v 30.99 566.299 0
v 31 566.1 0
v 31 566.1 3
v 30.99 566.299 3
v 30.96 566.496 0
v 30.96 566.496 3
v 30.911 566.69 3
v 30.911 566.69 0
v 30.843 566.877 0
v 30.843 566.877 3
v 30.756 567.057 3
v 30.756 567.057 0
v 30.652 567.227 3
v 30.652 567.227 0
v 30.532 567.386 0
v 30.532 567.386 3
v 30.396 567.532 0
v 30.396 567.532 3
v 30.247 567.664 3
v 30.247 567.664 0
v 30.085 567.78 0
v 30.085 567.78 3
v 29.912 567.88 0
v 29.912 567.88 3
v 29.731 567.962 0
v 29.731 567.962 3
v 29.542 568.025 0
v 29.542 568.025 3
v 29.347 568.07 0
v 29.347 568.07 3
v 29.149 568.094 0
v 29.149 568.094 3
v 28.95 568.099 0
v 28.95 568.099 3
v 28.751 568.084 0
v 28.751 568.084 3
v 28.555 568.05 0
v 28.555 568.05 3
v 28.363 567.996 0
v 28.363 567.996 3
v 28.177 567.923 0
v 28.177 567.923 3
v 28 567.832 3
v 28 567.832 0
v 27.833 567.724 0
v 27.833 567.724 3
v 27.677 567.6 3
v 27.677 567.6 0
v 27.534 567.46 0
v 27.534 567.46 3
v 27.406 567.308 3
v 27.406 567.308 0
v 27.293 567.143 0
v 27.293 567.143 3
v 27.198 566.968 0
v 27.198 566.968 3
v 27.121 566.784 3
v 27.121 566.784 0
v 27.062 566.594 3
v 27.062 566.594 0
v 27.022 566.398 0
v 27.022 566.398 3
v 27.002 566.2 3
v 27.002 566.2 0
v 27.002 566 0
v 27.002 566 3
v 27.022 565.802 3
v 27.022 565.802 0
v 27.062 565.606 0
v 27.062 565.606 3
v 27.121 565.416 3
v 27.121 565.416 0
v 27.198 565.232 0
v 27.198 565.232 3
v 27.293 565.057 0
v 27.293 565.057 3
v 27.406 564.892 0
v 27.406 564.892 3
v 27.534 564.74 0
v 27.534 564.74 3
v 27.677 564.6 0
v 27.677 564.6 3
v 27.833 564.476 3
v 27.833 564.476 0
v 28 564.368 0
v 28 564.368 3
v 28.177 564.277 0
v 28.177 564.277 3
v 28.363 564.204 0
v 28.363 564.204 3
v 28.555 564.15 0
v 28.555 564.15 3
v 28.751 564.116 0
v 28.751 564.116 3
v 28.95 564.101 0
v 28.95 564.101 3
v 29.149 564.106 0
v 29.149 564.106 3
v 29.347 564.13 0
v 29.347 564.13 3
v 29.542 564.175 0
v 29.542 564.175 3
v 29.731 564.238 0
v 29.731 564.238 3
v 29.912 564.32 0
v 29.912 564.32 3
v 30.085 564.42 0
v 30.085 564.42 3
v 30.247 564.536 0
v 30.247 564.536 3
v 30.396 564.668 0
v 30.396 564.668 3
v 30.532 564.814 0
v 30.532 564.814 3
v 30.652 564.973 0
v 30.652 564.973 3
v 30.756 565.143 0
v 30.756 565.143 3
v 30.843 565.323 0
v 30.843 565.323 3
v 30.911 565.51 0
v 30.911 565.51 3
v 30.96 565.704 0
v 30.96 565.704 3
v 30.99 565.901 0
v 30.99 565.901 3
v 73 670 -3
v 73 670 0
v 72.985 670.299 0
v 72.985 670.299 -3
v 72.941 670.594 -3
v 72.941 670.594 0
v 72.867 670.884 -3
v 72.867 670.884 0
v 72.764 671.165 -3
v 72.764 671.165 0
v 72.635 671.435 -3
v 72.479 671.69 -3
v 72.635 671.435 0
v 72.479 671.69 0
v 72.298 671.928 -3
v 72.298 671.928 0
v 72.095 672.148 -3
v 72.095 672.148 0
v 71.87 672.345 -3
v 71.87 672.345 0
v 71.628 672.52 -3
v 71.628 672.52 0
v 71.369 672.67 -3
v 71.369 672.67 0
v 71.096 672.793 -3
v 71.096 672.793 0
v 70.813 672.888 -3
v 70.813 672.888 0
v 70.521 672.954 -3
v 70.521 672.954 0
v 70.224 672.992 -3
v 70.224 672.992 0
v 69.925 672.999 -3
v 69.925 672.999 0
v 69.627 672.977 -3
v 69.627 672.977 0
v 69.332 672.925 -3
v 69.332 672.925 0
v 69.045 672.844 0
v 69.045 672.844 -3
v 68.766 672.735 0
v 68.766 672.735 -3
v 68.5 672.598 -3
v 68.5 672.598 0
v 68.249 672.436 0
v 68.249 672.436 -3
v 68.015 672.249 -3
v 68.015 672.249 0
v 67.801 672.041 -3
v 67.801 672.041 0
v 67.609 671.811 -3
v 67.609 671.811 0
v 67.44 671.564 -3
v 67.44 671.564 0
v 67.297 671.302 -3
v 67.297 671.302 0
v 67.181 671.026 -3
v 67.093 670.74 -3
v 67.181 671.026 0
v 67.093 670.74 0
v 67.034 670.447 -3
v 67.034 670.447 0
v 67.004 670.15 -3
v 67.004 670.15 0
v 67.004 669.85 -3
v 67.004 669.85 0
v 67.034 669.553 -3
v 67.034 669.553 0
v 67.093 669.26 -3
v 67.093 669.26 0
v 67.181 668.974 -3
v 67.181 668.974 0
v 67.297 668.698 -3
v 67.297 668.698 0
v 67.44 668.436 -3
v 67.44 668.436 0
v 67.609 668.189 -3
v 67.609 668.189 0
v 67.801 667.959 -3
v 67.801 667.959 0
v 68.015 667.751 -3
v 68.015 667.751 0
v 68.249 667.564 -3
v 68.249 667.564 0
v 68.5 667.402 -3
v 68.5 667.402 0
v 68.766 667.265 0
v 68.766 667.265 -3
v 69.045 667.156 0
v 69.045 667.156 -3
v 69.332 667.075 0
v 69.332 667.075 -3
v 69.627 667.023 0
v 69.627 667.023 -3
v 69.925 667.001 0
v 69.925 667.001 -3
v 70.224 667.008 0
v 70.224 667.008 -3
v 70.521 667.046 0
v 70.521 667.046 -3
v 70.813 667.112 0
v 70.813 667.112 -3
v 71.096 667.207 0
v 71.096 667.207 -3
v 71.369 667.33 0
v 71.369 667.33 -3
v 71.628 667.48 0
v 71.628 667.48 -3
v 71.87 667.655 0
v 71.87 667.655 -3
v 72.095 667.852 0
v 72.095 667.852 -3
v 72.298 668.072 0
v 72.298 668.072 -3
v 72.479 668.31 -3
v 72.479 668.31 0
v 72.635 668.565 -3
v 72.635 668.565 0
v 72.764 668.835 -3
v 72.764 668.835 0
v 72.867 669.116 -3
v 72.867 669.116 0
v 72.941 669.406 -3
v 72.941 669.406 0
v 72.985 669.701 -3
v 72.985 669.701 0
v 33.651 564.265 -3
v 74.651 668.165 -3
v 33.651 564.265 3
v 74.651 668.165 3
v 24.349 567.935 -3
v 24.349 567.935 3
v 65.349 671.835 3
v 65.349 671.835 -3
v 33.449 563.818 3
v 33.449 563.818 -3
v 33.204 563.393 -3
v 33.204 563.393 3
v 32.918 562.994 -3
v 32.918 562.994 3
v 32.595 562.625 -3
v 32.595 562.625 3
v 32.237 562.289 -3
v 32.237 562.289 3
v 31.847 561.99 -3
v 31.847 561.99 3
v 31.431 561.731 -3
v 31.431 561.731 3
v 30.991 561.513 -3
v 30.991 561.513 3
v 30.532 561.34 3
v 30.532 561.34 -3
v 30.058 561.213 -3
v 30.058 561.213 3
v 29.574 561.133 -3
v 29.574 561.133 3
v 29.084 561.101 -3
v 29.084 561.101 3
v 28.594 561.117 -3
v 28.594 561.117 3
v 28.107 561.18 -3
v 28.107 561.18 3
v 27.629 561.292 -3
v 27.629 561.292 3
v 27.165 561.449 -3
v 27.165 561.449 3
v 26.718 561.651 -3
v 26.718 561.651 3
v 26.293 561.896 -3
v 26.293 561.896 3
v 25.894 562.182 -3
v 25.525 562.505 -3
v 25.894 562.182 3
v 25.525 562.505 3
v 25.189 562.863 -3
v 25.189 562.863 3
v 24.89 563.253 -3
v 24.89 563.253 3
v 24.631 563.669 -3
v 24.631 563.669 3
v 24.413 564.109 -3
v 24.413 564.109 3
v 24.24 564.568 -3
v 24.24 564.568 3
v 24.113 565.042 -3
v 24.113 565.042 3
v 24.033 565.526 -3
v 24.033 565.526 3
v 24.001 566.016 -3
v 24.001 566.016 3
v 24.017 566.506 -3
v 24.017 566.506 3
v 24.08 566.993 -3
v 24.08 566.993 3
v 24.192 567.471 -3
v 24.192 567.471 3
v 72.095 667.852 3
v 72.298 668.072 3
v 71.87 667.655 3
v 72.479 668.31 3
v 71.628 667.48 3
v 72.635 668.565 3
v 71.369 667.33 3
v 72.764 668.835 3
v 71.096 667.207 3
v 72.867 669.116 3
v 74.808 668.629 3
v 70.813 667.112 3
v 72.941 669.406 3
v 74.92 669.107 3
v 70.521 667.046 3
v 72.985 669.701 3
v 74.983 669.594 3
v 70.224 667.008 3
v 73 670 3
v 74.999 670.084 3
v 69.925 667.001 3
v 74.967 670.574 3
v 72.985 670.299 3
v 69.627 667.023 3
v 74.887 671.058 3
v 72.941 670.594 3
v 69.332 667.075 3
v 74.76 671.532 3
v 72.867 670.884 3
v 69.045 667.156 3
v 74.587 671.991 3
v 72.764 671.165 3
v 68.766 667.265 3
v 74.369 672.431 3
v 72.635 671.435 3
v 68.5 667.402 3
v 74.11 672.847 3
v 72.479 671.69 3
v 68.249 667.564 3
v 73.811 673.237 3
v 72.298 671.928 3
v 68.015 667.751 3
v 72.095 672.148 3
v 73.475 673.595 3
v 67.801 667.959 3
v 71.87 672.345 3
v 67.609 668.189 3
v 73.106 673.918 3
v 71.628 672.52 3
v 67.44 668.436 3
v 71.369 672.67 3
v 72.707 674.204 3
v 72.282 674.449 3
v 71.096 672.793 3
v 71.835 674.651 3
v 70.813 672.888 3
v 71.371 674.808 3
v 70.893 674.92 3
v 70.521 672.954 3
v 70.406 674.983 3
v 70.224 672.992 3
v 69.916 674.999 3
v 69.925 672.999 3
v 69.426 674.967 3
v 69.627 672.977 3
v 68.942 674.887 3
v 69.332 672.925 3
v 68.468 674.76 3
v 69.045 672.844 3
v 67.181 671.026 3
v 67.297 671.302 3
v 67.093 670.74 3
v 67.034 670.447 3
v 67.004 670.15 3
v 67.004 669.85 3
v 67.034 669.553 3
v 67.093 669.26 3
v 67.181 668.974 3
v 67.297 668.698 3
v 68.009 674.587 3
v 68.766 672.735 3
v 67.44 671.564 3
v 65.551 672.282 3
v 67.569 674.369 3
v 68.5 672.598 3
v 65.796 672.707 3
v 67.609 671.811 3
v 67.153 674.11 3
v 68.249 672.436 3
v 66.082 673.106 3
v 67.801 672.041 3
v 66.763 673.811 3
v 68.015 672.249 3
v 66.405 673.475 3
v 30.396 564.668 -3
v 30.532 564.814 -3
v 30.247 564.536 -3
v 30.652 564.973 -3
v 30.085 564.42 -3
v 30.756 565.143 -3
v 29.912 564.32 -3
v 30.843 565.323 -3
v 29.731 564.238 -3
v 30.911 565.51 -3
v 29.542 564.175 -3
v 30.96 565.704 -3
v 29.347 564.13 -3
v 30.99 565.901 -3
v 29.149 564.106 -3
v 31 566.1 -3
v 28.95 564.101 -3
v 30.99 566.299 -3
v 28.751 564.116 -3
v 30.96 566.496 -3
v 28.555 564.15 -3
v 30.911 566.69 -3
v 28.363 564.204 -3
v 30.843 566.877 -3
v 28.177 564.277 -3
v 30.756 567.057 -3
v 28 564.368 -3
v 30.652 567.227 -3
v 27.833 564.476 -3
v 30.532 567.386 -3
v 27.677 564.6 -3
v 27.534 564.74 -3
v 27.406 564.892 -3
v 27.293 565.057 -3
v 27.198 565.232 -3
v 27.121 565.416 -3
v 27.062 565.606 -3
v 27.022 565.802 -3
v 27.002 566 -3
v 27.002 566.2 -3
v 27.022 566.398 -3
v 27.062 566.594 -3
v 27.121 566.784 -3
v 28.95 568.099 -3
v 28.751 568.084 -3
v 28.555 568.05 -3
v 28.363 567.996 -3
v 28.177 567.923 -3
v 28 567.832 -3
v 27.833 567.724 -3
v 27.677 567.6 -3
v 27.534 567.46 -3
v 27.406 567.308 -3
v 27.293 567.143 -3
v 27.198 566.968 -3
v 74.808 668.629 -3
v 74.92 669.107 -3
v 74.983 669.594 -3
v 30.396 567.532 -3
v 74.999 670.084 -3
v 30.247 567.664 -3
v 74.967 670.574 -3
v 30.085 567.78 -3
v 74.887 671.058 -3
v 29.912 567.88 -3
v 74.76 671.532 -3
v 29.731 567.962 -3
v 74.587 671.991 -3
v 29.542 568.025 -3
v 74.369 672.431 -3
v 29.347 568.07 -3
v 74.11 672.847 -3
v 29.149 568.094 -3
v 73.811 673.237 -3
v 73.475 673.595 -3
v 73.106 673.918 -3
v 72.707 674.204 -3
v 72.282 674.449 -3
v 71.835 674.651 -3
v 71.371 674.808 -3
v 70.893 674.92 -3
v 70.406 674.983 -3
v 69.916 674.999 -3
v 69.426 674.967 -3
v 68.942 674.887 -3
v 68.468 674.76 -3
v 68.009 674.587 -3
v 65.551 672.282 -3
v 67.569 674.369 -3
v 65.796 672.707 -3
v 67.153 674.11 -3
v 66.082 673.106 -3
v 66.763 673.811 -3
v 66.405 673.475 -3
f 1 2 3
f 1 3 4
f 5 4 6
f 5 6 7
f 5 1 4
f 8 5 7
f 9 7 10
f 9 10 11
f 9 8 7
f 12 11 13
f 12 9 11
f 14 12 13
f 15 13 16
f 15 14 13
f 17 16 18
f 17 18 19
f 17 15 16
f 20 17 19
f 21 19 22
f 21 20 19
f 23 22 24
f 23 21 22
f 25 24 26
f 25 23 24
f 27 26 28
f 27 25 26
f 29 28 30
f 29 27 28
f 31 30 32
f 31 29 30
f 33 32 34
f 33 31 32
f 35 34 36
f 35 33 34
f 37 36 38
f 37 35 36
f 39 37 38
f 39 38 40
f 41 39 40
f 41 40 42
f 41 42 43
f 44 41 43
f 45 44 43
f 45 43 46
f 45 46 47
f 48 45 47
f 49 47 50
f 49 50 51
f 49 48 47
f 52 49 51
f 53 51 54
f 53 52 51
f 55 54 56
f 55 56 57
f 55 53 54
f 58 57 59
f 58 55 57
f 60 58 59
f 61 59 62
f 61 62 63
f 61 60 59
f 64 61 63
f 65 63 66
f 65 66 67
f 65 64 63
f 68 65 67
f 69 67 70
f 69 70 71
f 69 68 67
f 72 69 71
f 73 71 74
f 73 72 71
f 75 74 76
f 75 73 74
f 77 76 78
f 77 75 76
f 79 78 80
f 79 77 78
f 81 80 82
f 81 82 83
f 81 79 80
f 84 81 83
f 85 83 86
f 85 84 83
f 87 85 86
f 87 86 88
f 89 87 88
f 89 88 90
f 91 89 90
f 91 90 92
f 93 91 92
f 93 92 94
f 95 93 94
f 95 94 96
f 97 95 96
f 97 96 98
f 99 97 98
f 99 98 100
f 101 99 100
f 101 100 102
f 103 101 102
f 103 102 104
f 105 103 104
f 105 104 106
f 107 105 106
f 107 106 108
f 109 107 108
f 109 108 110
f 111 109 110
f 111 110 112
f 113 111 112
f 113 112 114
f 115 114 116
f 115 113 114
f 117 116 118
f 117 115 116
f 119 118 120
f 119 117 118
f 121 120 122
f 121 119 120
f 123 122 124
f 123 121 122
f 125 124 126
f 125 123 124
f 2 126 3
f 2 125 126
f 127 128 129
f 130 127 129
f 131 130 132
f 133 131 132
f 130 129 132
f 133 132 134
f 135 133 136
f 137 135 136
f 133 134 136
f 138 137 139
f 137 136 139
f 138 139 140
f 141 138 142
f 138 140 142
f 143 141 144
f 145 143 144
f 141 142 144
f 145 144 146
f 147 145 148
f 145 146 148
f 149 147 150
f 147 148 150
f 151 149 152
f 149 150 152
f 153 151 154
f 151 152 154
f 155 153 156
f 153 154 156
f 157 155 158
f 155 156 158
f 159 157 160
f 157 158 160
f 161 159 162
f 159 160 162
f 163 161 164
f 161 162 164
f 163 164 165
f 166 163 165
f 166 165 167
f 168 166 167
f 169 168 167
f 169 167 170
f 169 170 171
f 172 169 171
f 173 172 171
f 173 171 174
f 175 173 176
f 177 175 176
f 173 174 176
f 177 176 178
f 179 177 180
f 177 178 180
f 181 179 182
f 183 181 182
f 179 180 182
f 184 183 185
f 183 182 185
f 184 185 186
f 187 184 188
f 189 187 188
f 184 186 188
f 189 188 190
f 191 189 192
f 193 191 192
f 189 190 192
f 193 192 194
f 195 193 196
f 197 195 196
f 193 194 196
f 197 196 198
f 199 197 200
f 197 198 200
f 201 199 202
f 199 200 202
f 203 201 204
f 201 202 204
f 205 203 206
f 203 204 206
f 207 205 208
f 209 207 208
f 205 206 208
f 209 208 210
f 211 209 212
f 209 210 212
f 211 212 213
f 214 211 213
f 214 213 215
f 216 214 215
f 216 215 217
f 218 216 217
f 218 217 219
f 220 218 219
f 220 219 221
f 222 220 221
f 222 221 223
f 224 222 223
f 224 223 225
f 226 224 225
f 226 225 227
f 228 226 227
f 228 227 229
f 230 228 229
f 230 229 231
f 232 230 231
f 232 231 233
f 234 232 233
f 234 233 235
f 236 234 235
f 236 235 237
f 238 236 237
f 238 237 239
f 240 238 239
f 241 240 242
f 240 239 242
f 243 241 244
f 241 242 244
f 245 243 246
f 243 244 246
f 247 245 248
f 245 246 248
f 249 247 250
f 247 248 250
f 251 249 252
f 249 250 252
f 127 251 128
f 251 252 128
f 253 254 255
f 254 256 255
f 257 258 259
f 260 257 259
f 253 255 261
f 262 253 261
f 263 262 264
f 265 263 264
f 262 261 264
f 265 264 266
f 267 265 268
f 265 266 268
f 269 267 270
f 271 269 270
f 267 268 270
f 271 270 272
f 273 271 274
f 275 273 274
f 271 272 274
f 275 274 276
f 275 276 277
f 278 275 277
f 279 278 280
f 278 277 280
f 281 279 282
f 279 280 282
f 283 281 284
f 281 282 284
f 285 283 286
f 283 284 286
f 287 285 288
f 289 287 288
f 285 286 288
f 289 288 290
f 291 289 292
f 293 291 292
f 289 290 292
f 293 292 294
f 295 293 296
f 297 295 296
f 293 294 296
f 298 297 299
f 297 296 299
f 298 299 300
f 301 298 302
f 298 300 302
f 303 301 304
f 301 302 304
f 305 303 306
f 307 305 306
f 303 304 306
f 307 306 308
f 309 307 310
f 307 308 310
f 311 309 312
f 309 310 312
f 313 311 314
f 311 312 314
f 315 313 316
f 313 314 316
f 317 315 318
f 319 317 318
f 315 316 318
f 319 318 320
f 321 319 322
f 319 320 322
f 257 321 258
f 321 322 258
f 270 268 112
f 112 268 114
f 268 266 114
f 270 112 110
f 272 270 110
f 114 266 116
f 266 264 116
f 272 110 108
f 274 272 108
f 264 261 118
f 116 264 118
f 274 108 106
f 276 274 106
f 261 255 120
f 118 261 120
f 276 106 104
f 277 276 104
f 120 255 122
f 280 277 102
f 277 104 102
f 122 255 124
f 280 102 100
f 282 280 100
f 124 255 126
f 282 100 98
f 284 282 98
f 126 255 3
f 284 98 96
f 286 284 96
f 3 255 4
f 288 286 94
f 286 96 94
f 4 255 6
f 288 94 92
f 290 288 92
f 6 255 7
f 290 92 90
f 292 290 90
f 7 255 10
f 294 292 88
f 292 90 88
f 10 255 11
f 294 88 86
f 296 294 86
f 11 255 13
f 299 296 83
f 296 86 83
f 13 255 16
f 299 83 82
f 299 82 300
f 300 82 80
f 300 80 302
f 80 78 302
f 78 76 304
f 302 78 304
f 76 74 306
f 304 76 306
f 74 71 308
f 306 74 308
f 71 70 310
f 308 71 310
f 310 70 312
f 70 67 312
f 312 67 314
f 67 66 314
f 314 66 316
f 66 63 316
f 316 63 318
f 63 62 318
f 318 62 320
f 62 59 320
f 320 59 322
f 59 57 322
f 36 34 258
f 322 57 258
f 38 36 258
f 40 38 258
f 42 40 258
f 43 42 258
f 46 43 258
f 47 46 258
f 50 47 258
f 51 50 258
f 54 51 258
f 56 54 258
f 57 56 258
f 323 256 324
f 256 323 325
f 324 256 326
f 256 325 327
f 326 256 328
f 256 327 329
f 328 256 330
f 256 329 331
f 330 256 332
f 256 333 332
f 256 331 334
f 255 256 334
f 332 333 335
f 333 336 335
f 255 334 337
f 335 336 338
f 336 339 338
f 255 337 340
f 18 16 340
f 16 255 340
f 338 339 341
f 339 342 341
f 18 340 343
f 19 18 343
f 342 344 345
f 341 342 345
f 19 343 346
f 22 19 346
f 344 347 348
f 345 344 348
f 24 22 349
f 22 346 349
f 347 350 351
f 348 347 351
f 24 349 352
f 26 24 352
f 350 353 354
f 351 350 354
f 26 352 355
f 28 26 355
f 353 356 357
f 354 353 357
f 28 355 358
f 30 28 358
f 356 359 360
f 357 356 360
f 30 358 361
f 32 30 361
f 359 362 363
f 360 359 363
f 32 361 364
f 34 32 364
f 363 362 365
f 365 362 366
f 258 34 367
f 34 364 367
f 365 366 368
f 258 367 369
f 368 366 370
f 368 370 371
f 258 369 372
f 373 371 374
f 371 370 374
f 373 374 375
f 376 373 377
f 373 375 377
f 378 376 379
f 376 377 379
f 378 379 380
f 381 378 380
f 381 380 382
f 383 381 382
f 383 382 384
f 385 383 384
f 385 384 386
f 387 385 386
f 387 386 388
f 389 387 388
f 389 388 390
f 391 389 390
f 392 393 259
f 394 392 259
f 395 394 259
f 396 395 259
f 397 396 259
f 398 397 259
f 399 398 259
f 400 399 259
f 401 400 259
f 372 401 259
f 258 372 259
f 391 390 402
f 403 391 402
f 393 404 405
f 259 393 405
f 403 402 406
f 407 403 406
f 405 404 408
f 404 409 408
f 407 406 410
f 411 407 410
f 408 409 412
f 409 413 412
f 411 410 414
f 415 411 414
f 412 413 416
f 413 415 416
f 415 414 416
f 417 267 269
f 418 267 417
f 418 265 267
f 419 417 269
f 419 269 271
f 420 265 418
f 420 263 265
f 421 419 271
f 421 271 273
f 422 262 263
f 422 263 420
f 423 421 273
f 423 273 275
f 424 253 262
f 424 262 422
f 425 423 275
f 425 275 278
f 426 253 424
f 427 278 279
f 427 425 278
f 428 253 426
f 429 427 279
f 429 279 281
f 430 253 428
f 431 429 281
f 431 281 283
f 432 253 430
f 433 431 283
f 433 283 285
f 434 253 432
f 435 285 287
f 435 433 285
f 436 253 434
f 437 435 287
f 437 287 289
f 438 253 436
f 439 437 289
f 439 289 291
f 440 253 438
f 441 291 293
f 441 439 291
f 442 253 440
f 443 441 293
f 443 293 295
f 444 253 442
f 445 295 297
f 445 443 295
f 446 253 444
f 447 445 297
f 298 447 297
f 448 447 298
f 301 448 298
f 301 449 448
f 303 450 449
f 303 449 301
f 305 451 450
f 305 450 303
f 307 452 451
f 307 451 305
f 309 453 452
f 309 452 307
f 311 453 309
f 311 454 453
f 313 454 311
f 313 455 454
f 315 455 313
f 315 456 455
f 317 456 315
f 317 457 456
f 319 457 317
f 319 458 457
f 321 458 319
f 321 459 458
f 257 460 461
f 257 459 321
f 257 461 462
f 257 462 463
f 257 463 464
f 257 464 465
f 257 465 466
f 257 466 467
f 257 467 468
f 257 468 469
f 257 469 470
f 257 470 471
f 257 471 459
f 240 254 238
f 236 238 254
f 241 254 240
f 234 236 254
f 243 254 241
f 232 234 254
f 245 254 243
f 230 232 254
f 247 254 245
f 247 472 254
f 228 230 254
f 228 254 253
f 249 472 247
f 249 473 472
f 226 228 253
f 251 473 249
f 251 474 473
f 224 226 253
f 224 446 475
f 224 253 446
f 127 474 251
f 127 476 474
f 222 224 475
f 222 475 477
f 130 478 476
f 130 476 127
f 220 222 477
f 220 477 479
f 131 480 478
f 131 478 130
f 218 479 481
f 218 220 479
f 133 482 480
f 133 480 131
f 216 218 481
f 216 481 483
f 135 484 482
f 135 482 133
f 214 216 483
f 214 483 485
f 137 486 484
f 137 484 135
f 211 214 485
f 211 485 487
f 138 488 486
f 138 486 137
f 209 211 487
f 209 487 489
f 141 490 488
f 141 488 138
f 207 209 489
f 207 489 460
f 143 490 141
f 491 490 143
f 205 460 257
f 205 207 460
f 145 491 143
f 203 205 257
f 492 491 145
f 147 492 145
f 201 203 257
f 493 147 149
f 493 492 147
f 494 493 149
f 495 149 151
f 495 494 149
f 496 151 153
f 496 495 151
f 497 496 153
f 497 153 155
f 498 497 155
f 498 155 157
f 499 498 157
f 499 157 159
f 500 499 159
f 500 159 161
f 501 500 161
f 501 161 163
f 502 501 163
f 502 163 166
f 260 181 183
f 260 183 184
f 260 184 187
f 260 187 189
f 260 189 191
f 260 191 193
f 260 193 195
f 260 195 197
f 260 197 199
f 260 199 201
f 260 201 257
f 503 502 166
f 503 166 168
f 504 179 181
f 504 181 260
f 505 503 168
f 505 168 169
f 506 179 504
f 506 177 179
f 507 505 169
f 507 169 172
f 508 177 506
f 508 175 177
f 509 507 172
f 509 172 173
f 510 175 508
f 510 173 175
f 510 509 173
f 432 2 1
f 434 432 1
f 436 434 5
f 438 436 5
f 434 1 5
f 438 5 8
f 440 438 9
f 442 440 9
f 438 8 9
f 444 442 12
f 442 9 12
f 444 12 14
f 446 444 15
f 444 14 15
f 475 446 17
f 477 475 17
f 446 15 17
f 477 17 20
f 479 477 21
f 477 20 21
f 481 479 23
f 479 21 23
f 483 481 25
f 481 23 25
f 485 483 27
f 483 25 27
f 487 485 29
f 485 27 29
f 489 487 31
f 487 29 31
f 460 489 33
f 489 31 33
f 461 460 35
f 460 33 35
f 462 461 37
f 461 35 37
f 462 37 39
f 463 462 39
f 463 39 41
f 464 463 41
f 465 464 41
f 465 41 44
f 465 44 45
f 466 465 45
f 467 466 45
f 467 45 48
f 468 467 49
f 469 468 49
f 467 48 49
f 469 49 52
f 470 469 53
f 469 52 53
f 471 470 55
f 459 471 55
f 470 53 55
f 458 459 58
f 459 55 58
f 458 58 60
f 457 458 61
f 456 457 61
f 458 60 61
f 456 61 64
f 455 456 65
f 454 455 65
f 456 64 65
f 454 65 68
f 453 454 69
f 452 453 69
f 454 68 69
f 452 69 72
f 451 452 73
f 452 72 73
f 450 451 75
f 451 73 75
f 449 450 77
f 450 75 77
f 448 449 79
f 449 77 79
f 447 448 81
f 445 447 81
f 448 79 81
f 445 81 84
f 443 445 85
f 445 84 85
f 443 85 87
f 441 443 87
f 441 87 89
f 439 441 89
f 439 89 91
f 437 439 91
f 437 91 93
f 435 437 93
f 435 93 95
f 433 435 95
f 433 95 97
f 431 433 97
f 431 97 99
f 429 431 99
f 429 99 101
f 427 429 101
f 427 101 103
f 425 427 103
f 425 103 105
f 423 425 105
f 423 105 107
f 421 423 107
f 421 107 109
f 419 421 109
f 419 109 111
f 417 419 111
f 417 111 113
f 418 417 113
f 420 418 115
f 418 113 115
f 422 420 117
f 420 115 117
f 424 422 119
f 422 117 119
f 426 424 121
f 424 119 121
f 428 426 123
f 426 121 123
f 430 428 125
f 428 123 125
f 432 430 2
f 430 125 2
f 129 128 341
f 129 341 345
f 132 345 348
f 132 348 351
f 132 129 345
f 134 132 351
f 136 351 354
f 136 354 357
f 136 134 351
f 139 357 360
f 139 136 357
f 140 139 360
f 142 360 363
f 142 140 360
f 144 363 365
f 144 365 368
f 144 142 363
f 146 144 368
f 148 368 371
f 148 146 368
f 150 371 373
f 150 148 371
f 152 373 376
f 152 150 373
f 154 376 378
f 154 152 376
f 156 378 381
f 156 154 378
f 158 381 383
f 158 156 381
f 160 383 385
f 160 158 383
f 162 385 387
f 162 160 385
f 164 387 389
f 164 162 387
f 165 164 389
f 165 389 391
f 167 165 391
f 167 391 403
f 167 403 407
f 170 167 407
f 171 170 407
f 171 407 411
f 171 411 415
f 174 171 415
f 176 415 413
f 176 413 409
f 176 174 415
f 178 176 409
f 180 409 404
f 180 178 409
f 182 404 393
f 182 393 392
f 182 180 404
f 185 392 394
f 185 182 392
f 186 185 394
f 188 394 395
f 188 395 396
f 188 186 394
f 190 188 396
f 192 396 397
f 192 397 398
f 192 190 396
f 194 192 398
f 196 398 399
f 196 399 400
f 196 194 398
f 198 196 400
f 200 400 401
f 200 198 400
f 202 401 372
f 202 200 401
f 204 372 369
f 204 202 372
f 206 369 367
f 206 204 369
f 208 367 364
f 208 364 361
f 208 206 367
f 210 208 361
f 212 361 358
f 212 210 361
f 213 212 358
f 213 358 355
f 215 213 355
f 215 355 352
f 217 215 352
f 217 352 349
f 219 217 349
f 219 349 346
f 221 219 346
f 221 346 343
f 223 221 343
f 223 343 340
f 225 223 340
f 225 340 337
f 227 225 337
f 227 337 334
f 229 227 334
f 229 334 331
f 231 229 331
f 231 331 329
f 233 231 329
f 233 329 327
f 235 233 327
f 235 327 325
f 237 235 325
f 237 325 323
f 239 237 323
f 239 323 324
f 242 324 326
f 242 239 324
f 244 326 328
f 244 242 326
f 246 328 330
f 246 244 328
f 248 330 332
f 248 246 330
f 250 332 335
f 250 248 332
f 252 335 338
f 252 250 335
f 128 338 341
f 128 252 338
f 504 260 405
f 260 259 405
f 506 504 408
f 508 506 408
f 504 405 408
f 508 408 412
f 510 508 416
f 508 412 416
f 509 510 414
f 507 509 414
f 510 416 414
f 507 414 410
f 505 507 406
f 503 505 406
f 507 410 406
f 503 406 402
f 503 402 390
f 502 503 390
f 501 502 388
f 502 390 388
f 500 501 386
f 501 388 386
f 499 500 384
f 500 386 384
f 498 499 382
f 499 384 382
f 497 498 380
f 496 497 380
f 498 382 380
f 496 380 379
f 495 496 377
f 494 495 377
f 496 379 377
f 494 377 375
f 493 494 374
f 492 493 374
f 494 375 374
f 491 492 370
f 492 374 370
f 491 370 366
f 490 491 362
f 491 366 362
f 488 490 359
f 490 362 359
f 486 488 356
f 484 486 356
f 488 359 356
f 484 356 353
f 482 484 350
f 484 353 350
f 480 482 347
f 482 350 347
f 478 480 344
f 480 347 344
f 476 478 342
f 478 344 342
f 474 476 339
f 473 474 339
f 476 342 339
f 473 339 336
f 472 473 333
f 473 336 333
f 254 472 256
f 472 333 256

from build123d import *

# Parameters (mm, degrees)
AUFSATZ_LINEAR_AUSTRAGEN1_DEPTH      = 3
AUFSATZ_LINEAR_AUSTRAGEN1_DEPTH_BACK = 3
SKIZZE3_R                            = 3
SKIZZE3_R_2                          = 2


with BuildPart() as part:
    # Skizze3 → Aufsatz-Linear austragen1 (new, two sides: drawn at the far end of the back side and taken through both)
    with BuildSketch(Plane.XY.offset(-AUFSATZ_LINEAR_AUSTRAGEN1_DEPTH_BACK)):
        with BuildLine():
            Line((24.349022765, 567.935323067), (65.349022765, 671.835323067))
            ThreePointArc((65.349022765, 671.835323067), (71.835323067, 674.650977235), (74.650977235, 668.164676933))
            Line((74.650977235, 668.164676933), (33.650977235, 564.264676933))
            ThreePointArc((33.650977235, 564.264676933), (27.164676933, 561.449022765), (24.349022765, 567.935323067))
        make_face()
        with Locations((70, 670)):
            Circle(SKIZZE3_R, mode=Mode.SUBTRACT)
        with Locations((29, 566.1)):
            Circle(SKIZZE3_R_2, mode=Mode.SUBTRACT)
    extrude(amount=AUFSATZ_LINEAR_AUSTRAGEN1_DEPTH + AUFSATZ_LINEAR_AUSTRAGEN1_DEPTH_BACK)


solid = part.part
